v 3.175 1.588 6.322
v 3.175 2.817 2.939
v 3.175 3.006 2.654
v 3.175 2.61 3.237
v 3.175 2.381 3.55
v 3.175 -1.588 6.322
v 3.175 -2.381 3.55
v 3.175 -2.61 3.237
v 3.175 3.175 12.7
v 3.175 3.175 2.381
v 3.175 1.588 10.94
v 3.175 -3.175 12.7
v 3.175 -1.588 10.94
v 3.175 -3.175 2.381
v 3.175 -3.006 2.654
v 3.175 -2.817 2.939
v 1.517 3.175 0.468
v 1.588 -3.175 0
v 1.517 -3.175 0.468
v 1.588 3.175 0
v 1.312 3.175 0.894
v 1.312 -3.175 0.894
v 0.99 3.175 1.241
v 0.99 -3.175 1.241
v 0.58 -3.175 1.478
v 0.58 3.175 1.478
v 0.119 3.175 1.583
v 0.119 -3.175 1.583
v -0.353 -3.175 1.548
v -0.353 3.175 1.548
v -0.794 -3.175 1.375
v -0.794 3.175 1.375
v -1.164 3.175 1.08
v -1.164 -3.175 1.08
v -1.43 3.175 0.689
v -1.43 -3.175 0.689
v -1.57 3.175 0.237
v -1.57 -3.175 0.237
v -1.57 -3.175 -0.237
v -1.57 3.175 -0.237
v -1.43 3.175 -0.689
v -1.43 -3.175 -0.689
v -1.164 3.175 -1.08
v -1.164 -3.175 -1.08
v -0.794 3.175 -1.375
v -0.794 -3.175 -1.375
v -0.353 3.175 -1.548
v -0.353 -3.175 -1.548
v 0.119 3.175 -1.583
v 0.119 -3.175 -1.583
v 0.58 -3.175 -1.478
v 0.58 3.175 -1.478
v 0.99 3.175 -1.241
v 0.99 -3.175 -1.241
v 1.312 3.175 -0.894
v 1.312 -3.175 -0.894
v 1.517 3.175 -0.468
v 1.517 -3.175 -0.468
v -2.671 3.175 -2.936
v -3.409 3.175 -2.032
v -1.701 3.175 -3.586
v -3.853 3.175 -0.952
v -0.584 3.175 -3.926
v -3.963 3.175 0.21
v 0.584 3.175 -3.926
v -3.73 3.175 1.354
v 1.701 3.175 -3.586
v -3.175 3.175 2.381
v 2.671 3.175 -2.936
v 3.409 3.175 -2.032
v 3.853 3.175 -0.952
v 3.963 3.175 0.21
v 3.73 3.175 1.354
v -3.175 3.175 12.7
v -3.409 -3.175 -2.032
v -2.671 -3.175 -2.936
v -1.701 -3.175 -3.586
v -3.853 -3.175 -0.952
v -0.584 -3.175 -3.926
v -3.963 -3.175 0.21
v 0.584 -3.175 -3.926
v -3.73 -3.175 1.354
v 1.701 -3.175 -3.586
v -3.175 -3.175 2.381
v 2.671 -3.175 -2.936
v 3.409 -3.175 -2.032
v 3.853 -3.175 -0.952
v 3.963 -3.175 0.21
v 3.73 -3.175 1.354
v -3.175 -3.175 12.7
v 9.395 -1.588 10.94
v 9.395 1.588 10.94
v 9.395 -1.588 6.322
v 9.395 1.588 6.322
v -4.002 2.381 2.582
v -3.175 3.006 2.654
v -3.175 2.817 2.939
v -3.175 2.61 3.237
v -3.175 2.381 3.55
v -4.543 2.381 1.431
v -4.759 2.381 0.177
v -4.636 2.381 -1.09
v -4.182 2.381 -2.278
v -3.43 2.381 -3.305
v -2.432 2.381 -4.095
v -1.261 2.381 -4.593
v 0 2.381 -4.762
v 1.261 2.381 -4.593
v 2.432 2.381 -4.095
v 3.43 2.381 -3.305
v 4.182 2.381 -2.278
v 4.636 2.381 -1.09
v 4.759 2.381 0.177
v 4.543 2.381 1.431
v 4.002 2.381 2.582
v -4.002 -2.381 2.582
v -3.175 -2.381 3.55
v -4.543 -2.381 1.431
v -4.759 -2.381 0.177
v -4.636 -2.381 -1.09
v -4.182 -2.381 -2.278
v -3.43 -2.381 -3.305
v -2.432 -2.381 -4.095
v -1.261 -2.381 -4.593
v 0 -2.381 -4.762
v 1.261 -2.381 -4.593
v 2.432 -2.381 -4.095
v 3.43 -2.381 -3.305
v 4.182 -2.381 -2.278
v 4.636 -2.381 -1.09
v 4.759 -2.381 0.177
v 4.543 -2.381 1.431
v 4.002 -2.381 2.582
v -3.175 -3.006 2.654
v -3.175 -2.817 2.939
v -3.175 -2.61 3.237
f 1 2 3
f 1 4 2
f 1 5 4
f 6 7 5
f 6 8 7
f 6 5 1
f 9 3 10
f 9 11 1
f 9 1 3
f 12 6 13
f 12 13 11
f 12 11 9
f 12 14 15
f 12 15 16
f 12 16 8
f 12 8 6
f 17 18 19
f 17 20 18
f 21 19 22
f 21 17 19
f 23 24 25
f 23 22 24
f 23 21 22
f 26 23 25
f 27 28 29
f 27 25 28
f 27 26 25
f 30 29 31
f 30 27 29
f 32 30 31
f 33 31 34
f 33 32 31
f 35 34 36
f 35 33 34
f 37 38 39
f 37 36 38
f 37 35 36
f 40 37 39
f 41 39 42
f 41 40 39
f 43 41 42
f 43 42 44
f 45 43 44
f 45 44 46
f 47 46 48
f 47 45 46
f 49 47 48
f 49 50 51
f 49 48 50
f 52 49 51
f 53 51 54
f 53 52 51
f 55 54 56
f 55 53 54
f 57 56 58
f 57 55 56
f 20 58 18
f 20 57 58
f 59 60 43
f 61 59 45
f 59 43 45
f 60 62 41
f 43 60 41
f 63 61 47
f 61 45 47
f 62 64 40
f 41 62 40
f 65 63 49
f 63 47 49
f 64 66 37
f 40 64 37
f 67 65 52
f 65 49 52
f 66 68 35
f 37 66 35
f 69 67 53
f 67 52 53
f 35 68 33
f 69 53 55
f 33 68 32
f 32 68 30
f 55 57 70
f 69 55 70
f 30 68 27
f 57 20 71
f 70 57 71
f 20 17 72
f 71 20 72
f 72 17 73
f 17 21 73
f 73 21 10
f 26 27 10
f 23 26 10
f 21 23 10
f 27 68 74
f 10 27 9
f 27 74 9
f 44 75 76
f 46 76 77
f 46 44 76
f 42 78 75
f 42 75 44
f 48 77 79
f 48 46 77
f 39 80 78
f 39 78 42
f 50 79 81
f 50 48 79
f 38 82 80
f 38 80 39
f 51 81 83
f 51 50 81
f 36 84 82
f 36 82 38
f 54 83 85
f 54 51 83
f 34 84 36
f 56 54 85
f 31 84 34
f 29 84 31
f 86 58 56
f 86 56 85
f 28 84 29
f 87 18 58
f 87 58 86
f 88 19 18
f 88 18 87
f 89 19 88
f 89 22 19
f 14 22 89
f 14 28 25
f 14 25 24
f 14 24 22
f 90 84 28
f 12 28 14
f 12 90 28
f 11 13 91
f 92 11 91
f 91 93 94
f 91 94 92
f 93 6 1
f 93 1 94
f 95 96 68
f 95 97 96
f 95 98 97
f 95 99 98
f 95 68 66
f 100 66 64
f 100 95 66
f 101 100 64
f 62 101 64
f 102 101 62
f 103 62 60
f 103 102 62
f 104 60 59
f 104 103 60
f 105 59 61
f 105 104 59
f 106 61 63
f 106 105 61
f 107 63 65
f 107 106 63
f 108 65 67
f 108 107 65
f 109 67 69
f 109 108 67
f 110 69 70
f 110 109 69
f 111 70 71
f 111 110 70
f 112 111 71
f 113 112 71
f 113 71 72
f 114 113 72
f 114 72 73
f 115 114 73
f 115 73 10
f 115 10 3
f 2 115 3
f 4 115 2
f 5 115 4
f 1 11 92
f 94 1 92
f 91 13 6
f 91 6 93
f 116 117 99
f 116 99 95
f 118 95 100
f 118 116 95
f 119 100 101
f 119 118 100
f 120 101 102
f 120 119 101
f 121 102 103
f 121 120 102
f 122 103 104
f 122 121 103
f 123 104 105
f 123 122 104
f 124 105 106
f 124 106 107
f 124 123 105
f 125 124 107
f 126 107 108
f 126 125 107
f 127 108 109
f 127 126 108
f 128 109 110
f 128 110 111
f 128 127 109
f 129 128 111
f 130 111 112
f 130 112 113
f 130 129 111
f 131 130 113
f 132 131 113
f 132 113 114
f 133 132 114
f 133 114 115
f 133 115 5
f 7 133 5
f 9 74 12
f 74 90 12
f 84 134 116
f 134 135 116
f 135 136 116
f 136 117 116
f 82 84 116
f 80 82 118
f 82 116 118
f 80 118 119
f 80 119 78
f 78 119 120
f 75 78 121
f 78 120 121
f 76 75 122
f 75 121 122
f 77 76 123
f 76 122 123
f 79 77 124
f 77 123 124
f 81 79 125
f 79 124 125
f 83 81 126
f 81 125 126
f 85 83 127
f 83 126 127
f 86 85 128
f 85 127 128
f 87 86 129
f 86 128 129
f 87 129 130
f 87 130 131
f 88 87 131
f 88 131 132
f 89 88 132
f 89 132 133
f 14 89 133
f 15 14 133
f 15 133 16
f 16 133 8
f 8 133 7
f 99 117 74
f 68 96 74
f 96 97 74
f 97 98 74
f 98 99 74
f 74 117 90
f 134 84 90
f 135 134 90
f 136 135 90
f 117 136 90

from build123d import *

# Parameters (mm, degrees)
F0_R     = 4.7625
F0_R_2   = 1.5875
F4_DEPTH = 3.175
F1_W     = 6.35
F1_H     = 12.7
F5_DEPTH = 3.175
F3_R     = 1.5875
F6_DEPTH = 12.7
F7_SIZE  = 0.79375
F2_W     = 7.2895279154
F2_H     = 4.6182582155
F8_DEPTH = 1.5875


with BuildPart() as f4:
    # F0 (on Front) → F4 (new body, symmetric)
    with BuildSketch(Plane.XZ):
        Circle(F0_R)
        Circle(F0_R_2, mode=Mode.SUBTRACT)
    extrude(amount=F4_DEPTH, both=True)

    # F1 (on Front) → F5 (join, symmetric)
    with BuildSketch(Plane.XZ):
        with Locations((0, 6.35)):
            Rectangle(F1_W, F1_H)
    extrude(amount=F5_DEPTH, both=True)

    # F3 (on Front) → F6 (cut, symmetric)
    with BuildSketch(Plane.XZ):
        Circle(F3_R)
    extrude(amount=F6_DEPTH, both=True, mode=Mode.SUBTRACT)

    # F7
    f7_edges = [f4.edges().sort_by_distance(p)[0] for p in [
        (0, 3.175, -4.7625),
        (0, -3.175, -4.7625),
    ]]
    chamfer(f7_edges, length=F7_SIZE)

    # F2 (on Front) → F8 (join, symmetric)
    with BuildSketch(Plane.XZ):
        with Locations((5.749846343, 8.6307809688)):
            Rectangle(F2_W, F2_H)
    extrude(amount=F8_DEPTH, both=True)


solid = f4.part
